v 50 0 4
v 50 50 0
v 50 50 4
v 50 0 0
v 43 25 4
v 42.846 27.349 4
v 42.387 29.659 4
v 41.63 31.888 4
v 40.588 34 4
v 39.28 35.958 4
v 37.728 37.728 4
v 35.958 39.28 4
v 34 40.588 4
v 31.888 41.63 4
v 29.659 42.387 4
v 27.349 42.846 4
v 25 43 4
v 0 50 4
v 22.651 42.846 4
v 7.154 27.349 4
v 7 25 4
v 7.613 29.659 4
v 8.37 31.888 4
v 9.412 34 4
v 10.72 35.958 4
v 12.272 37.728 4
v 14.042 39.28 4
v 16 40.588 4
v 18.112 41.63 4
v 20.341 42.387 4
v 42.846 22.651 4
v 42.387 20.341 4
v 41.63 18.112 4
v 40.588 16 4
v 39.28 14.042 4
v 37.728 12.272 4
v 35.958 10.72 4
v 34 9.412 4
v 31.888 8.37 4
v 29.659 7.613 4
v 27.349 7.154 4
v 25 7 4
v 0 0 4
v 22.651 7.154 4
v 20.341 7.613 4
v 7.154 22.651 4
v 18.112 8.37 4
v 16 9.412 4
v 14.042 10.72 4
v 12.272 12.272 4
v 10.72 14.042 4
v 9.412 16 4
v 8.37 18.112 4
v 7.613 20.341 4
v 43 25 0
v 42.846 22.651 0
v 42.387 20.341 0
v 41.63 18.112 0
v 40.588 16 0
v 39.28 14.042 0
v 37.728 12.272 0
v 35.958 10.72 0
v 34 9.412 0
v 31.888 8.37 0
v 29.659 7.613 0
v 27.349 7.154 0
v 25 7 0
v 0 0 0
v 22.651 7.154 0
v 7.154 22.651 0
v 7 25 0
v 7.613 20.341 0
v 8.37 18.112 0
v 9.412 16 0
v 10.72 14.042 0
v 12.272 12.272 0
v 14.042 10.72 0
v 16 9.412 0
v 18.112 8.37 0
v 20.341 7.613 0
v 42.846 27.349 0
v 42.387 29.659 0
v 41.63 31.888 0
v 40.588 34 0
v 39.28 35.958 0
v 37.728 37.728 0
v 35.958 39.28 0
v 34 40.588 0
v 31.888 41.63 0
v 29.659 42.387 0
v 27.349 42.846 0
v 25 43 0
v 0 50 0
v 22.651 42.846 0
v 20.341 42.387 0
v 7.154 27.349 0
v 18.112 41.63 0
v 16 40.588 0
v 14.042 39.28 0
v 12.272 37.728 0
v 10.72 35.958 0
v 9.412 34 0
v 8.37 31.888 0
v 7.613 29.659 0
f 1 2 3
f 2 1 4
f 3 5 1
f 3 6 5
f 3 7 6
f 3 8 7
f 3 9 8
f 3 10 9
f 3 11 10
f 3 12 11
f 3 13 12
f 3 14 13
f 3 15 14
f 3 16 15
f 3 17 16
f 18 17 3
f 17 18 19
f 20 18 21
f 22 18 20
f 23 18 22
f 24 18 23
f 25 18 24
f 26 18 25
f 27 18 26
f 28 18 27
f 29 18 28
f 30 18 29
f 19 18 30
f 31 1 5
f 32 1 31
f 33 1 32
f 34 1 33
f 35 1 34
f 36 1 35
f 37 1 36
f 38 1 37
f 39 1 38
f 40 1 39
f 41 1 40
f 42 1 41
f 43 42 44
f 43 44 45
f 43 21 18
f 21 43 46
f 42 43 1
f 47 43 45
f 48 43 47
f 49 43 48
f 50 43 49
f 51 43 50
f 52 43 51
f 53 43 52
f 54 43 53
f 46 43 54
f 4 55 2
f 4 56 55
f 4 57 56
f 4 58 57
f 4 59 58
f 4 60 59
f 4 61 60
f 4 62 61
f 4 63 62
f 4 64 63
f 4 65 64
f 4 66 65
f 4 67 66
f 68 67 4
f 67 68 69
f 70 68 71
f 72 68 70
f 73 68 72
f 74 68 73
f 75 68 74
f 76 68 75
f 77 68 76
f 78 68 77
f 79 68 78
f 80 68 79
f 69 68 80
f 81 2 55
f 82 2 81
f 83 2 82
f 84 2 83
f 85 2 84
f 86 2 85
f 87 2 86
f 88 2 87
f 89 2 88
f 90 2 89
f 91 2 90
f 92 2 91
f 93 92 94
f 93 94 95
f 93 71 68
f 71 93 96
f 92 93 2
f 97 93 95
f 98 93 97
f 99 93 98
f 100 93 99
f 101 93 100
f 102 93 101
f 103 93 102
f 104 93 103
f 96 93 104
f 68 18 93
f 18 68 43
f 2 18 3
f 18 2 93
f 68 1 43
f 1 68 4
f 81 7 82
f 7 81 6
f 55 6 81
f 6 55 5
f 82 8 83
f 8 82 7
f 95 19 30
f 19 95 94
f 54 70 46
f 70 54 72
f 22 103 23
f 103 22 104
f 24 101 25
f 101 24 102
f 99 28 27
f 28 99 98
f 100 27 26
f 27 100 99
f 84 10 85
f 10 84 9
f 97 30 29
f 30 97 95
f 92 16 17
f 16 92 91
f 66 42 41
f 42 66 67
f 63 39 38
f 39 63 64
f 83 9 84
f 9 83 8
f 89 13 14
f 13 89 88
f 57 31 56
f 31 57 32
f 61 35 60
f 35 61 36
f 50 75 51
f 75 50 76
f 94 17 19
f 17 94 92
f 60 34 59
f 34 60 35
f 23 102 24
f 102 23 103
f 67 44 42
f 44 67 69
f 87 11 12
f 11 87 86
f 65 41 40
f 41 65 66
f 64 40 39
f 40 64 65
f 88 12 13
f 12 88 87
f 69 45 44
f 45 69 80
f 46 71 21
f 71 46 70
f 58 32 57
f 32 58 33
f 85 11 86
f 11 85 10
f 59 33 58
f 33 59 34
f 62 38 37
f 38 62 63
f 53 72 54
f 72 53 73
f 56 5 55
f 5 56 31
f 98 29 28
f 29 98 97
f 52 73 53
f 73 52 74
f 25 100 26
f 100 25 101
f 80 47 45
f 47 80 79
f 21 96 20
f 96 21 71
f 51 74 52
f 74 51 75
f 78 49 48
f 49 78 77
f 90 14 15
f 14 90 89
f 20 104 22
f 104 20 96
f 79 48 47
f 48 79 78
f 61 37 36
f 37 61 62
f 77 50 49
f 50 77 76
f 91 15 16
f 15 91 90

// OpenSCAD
module m775(){
  difference(){ cube([50,50,4]); translate([25,25,-0.1]) cylinder(h=4.2,r=18,$fn=48); }
}
m775();
